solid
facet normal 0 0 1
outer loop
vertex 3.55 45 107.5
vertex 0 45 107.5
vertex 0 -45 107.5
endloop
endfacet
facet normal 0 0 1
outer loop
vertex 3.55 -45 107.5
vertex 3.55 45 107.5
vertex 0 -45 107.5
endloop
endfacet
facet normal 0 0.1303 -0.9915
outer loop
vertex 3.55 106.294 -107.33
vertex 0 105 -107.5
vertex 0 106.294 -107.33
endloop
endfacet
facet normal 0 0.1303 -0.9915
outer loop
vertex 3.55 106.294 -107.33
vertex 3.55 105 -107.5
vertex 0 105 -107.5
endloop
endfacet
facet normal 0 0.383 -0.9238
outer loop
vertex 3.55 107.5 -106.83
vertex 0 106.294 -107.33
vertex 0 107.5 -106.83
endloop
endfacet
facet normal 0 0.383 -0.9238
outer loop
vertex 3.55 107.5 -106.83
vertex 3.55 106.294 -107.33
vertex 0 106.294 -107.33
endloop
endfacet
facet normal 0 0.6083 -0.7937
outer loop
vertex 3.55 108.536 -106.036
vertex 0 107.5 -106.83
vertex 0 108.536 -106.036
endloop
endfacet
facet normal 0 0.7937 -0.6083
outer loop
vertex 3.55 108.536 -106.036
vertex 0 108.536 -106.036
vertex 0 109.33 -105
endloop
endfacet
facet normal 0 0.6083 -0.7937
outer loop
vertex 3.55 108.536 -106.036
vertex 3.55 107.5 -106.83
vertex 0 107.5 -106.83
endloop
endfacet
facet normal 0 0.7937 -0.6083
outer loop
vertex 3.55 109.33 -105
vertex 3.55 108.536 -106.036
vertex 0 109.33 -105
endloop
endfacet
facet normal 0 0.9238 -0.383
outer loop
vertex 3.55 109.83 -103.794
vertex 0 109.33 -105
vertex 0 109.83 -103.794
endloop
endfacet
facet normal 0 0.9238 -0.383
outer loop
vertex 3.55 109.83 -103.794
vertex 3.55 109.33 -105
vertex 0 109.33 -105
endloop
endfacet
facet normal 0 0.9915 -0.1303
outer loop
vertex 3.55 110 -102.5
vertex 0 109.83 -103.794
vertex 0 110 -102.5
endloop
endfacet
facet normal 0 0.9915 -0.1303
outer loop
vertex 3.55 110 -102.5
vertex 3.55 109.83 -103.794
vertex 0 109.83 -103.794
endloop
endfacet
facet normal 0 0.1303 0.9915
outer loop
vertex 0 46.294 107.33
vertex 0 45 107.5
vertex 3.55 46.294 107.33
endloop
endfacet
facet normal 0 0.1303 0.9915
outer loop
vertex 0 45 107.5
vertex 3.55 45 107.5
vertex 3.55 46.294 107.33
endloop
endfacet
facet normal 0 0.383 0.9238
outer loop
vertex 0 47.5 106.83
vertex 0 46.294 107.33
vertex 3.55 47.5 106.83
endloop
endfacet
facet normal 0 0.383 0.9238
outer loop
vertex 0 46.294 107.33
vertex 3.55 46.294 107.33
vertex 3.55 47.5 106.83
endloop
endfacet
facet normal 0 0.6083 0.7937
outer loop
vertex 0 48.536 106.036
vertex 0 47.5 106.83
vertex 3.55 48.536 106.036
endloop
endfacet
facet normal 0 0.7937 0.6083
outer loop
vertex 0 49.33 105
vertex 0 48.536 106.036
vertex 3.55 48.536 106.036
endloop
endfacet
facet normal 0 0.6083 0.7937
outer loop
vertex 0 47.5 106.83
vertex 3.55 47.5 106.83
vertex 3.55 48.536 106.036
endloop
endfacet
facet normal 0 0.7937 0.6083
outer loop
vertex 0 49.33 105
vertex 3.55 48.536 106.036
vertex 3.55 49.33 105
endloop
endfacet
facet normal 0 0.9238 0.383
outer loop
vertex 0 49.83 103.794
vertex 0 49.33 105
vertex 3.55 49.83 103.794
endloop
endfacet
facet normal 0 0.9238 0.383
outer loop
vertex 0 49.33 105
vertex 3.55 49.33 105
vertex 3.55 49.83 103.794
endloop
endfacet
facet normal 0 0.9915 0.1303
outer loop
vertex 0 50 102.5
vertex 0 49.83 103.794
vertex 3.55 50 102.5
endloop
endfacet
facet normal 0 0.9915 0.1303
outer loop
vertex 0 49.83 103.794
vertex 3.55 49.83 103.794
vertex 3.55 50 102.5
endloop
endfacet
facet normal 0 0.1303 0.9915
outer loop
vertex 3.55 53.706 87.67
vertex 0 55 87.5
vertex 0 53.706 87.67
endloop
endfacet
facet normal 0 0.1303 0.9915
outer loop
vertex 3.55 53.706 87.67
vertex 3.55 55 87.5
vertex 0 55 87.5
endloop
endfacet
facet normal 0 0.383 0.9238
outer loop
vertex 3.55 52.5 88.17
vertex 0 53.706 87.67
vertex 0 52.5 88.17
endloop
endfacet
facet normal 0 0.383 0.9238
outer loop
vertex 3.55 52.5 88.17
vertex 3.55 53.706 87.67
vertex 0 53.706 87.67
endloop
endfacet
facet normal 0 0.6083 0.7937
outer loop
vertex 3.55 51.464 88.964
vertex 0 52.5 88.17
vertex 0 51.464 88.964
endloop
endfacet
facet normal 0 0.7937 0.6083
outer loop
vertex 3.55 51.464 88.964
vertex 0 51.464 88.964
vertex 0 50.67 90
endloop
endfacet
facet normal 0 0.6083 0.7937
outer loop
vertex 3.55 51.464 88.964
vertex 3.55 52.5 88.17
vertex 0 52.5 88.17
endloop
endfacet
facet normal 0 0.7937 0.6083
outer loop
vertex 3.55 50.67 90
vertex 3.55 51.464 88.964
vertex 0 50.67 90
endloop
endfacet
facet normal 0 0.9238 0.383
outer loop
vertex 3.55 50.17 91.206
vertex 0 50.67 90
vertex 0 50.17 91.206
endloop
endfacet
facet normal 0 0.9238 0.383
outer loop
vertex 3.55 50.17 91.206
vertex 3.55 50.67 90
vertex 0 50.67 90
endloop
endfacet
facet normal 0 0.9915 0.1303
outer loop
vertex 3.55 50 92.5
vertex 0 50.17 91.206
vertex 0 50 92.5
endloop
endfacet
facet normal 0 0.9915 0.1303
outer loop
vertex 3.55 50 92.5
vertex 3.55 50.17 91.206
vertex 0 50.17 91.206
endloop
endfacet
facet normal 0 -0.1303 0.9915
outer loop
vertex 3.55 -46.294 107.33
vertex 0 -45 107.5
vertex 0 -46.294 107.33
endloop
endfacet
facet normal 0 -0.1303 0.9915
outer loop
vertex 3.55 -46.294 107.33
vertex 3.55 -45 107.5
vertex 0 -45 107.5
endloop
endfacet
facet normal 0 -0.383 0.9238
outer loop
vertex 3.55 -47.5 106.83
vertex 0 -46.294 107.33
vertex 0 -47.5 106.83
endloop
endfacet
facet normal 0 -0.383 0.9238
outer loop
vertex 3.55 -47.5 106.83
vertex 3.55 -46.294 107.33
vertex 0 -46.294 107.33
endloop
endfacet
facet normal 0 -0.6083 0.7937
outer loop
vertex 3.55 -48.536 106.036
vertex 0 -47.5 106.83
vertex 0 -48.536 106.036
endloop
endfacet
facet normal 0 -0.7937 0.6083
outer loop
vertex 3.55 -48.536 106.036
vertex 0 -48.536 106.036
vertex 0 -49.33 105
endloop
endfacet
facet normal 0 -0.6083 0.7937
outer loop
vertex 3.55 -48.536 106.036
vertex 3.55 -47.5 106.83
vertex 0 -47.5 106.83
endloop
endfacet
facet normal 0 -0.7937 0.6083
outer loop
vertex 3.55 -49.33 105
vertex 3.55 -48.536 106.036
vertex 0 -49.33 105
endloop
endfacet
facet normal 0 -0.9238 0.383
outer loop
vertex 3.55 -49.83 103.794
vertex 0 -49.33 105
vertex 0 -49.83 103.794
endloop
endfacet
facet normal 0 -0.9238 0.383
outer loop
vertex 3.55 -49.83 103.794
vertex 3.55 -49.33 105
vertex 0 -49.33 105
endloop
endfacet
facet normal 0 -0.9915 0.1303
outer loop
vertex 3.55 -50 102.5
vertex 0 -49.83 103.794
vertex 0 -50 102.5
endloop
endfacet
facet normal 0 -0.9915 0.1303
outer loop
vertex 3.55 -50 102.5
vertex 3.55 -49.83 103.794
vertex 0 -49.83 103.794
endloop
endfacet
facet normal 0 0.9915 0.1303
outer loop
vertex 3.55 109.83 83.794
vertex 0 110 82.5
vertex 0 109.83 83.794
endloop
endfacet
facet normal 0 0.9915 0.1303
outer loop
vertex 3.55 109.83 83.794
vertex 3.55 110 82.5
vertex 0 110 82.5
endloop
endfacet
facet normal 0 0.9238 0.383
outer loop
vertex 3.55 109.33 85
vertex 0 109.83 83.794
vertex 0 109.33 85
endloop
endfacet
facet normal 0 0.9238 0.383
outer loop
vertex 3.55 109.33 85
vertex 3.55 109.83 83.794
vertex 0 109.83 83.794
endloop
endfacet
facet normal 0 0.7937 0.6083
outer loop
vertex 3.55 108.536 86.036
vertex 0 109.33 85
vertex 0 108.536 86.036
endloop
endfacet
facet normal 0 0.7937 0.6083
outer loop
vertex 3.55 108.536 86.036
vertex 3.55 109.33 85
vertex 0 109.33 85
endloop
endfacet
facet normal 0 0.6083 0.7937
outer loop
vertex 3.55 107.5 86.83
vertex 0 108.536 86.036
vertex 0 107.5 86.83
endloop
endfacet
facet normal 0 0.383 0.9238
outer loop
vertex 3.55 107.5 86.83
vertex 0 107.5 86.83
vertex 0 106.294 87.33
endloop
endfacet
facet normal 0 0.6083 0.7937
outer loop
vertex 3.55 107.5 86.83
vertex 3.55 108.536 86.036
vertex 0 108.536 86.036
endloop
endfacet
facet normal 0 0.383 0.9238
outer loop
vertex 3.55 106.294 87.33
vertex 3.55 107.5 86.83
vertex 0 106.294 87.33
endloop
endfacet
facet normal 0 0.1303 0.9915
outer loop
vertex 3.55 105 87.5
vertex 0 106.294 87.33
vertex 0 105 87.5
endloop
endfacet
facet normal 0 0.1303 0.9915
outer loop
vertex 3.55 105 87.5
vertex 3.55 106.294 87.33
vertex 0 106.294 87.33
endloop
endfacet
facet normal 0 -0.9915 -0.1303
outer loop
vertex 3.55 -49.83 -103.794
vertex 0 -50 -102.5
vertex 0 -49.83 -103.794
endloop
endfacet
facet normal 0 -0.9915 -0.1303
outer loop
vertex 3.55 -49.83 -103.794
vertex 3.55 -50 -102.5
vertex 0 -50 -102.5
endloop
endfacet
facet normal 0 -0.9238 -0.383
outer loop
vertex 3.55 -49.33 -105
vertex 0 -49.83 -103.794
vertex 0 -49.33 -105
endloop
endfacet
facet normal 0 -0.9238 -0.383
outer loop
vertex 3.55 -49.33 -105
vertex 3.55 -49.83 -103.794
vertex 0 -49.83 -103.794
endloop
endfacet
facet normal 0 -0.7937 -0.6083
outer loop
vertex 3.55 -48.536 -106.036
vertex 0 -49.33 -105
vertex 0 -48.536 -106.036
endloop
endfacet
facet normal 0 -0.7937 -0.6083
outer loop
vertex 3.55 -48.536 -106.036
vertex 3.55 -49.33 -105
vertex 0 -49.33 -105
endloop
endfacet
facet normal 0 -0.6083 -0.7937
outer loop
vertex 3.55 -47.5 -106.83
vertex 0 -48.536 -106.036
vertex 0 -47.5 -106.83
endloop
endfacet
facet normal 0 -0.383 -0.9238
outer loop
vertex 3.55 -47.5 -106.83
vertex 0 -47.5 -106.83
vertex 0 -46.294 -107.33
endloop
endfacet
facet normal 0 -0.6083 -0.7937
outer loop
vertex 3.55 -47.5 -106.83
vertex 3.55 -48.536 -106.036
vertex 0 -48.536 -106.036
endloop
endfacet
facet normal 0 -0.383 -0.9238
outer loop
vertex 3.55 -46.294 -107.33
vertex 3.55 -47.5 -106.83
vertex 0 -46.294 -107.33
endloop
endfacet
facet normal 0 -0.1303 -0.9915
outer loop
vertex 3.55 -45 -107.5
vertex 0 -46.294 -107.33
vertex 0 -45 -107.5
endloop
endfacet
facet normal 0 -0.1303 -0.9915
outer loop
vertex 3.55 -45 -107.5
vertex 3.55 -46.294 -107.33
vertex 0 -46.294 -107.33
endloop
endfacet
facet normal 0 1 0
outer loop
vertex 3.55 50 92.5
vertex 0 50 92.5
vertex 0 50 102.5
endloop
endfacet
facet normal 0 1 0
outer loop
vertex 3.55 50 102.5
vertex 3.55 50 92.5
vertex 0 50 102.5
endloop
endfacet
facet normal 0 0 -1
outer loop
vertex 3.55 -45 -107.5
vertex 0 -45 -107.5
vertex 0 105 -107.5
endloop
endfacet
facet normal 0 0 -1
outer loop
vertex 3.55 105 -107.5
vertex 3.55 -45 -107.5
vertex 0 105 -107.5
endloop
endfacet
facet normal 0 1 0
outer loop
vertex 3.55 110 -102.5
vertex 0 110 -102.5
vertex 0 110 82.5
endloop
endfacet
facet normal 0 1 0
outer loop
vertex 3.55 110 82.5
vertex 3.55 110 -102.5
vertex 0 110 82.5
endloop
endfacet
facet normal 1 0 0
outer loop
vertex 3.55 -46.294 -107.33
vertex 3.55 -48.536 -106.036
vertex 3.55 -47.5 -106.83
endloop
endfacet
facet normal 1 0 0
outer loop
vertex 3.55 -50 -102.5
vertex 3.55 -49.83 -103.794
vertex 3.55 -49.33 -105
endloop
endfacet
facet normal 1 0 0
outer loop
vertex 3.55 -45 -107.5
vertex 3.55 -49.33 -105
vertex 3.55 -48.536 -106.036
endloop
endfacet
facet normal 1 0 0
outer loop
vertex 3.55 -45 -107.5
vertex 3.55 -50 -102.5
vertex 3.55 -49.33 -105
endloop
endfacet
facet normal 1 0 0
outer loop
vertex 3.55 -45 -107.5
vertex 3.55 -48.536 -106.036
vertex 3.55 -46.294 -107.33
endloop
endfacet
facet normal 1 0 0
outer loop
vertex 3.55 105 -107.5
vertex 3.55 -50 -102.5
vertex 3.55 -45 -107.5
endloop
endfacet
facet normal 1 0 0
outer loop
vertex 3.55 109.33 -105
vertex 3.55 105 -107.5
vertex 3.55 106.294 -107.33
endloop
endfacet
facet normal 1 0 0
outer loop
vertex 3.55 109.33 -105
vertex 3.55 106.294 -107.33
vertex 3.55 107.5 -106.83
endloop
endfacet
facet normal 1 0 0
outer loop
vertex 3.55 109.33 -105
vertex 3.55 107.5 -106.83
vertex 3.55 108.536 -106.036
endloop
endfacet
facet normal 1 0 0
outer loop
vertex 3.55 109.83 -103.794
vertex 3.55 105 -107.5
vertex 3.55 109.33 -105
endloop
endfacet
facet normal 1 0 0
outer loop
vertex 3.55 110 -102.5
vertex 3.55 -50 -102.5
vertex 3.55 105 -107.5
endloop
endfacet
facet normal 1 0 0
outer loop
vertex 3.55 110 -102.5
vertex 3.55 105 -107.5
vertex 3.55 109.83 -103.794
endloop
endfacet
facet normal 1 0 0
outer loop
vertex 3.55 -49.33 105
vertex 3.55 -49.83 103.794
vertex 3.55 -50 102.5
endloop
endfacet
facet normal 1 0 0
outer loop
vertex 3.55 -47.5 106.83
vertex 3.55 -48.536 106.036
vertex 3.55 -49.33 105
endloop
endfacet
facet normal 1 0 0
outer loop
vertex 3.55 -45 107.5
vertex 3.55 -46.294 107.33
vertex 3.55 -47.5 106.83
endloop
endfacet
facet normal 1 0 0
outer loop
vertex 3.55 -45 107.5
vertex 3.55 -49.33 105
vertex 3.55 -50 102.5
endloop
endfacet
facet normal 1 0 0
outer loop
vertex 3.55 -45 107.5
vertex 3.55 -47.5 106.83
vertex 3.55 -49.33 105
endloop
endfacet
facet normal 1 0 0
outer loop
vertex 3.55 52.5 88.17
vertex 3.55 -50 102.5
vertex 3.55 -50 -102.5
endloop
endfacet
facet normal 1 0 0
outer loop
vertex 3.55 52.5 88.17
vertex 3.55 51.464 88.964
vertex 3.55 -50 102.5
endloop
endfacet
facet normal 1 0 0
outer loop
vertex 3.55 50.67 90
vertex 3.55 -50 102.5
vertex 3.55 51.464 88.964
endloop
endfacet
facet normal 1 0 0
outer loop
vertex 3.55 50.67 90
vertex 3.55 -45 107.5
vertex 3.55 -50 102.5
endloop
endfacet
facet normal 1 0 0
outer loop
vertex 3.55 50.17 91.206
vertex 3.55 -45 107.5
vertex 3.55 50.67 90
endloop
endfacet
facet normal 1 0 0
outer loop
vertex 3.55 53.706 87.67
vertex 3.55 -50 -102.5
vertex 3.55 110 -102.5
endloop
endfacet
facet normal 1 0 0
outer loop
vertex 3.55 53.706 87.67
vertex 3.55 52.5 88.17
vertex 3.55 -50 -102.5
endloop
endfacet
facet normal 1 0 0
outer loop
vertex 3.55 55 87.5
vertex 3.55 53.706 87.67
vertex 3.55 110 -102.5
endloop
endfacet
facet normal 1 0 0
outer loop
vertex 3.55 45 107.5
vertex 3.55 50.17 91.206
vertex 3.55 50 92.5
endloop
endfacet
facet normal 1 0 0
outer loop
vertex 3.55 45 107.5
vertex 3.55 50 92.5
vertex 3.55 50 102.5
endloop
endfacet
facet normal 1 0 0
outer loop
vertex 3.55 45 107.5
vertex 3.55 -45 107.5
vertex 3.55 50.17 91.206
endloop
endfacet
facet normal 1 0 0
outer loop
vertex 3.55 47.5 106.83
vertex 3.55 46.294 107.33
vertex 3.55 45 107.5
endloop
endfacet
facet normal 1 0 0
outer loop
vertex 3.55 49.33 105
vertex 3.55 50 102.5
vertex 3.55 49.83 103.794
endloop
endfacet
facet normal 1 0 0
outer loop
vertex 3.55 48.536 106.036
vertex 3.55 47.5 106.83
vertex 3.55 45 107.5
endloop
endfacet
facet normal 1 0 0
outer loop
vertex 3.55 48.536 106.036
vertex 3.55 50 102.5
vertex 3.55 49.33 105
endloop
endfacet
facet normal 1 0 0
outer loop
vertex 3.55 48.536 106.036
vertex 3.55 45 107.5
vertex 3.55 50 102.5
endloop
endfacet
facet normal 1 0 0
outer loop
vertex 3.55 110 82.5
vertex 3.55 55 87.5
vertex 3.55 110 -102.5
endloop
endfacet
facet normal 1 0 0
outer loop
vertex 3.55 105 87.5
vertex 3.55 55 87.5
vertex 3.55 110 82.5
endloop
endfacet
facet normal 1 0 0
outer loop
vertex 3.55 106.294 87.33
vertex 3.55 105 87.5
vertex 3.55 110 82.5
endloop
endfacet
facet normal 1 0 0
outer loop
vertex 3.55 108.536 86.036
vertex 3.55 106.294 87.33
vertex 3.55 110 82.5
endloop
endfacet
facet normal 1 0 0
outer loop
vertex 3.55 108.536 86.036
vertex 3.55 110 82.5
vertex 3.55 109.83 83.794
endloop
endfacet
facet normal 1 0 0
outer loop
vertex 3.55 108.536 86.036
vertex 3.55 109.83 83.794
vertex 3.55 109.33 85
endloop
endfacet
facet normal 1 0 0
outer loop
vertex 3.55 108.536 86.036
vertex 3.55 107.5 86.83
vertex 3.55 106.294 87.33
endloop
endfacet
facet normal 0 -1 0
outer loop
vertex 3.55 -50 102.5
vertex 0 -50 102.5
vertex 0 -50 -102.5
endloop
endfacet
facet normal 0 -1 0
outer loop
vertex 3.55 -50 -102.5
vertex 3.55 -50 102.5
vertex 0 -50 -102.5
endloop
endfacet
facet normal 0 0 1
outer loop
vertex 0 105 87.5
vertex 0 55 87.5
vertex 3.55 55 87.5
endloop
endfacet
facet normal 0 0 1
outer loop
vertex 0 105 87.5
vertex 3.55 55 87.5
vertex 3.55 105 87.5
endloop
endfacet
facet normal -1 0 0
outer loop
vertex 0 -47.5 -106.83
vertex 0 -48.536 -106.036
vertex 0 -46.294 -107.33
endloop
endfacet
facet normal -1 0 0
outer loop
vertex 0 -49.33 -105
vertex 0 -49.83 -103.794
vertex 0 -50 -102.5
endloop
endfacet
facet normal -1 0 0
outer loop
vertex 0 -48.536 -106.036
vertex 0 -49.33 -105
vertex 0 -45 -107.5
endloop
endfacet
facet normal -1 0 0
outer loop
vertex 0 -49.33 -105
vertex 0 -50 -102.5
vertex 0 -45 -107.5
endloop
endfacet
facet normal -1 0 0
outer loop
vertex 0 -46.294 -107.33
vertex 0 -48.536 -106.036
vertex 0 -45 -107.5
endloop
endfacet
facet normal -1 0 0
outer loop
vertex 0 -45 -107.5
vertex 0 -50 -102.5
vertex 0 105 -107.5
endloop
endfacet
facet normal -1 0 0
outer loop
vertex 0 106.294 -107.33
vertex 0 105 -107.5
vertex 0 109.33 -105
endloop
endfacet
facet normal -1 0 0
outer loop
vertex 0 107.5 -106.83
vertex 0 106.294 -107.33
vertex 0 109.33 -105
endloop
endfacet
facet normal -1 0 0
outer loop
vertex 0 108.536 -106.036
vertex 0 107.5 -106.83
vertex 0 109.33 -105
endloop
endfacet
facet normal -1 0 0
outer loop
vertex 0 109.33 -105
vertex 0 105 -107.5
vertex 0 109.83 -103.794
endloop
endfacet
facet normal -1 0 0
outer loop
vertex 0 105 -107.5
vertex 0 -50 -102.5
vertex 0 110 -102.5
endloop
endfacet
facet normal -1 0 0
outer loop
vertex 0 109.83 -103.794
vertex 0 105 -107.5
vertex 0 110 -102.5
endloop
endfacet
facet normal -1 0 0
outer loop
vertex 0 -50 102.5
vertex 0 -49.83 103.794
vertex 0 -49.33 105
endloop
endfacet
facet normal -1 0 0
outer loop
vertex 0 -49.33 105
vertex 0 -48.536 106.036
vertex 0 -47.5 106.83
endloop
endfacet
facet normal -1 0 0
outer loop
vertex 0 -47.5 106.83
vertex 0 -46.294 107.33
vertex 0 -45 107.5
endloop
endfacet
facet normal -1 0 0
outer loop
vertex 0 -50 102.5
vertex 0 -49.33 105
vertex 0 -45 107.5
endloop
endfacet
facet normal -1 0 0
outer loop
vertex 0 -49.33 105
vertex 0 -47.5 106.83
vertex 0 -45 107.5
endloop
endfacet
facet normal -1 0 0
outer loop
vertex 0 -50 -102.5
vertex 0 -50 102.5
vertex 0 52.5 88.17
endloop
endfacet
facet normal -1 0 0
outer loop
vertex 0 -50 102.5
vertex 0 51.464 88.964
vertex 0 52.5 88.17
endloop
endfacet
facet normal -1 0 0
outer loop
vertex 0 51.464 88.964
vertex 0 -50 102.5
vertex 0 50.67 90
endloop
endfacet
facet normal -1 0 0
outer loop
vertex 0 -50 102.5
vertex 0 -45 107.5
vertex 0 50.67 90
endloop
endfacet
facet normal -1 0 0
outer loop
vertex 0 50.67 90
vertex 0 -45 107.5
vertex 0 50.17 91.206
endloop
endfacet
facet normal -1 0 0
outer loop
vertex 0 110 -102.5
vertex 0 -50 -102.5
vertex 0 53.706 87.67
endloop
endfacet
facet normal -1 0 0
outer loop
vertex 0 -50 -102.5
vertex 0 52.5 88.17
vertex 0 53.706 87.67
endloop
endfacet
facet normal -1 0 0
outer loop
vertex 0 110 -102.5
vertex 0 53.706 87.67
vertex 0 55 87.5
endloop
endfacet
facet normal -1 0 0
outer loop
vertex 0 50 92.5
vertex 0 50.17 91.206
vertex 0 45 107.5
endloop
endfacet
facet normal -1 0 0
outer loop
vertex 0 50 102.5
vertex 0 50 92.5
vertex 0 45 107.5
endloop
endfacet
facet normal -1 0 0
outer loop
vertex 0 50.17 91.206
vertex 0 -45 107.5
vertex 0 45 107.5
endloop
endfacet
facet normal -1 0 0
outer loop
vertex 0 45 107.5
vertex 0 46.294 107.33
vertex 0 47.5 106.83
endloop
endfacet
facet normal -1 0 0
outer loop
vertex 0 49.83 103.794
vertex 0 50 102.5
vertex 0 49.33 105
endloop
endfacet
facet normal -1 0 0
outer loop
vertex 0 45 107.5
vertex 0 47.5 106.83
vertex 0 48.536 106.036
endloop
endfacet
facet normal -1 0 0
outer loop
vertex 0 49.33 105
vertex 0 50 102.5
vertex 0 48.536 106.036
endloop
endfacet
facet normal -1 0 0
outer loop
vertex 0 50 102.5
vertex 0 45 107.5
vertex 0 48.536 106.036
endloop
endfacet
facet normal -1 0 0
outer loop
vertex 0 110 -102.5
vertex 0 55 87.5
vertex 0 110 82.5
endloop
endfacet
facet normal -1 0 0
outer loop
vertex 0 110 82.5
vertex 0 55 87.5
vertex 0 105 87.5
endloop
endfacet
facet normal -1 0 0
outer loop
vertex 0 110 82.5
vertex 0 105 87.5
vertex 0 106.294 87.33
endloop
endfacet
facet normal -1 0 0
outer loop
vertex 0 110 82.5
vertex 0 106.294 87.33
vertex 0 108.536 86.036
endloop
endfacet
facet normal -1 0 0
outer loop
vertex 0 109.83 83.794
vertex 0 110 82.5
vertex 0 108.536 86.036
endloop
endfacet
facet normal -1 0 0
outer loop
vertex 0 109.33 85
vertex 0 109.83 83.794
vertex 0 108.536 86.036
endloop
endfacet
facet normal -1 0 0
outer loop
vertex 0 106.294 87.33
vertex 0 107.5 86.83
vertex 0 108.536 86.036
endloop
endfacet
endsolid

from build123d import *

# Parameters (mm, degrees)
F0_W     = 60
F0_H     = 195
F1_DEPTH = 3.55
F2_R     = 5


with BuildPart() as f1:
    # F0 (on Right) → F1 (new body)
    with BuildSketch(Plane.YZ):
        Polygon((50, 87.5), (50, 107.5), (-50, 107.5), (-50, -107.5), (50, -107.5), align=None)
        with Locations((80, -10)):
            Rectangle(F0_W, F0_H)
    extrude(amount=F1_DEPTH)

    # F2
    f2_edges = [f1.edges().sort_by_distance(p)[0] for p in [
        (1.775, 50, 87.5),
        (1.775, 50, 107.5),
        (1.775, 110, 87.5),
        (1.775, -50, 107.5),
        (1.775, 110, -107.5),
        (1.775, -50, -107.5),
    ]]
    fillet(f2_edges, radius=F2_R)


solid = f1.part
